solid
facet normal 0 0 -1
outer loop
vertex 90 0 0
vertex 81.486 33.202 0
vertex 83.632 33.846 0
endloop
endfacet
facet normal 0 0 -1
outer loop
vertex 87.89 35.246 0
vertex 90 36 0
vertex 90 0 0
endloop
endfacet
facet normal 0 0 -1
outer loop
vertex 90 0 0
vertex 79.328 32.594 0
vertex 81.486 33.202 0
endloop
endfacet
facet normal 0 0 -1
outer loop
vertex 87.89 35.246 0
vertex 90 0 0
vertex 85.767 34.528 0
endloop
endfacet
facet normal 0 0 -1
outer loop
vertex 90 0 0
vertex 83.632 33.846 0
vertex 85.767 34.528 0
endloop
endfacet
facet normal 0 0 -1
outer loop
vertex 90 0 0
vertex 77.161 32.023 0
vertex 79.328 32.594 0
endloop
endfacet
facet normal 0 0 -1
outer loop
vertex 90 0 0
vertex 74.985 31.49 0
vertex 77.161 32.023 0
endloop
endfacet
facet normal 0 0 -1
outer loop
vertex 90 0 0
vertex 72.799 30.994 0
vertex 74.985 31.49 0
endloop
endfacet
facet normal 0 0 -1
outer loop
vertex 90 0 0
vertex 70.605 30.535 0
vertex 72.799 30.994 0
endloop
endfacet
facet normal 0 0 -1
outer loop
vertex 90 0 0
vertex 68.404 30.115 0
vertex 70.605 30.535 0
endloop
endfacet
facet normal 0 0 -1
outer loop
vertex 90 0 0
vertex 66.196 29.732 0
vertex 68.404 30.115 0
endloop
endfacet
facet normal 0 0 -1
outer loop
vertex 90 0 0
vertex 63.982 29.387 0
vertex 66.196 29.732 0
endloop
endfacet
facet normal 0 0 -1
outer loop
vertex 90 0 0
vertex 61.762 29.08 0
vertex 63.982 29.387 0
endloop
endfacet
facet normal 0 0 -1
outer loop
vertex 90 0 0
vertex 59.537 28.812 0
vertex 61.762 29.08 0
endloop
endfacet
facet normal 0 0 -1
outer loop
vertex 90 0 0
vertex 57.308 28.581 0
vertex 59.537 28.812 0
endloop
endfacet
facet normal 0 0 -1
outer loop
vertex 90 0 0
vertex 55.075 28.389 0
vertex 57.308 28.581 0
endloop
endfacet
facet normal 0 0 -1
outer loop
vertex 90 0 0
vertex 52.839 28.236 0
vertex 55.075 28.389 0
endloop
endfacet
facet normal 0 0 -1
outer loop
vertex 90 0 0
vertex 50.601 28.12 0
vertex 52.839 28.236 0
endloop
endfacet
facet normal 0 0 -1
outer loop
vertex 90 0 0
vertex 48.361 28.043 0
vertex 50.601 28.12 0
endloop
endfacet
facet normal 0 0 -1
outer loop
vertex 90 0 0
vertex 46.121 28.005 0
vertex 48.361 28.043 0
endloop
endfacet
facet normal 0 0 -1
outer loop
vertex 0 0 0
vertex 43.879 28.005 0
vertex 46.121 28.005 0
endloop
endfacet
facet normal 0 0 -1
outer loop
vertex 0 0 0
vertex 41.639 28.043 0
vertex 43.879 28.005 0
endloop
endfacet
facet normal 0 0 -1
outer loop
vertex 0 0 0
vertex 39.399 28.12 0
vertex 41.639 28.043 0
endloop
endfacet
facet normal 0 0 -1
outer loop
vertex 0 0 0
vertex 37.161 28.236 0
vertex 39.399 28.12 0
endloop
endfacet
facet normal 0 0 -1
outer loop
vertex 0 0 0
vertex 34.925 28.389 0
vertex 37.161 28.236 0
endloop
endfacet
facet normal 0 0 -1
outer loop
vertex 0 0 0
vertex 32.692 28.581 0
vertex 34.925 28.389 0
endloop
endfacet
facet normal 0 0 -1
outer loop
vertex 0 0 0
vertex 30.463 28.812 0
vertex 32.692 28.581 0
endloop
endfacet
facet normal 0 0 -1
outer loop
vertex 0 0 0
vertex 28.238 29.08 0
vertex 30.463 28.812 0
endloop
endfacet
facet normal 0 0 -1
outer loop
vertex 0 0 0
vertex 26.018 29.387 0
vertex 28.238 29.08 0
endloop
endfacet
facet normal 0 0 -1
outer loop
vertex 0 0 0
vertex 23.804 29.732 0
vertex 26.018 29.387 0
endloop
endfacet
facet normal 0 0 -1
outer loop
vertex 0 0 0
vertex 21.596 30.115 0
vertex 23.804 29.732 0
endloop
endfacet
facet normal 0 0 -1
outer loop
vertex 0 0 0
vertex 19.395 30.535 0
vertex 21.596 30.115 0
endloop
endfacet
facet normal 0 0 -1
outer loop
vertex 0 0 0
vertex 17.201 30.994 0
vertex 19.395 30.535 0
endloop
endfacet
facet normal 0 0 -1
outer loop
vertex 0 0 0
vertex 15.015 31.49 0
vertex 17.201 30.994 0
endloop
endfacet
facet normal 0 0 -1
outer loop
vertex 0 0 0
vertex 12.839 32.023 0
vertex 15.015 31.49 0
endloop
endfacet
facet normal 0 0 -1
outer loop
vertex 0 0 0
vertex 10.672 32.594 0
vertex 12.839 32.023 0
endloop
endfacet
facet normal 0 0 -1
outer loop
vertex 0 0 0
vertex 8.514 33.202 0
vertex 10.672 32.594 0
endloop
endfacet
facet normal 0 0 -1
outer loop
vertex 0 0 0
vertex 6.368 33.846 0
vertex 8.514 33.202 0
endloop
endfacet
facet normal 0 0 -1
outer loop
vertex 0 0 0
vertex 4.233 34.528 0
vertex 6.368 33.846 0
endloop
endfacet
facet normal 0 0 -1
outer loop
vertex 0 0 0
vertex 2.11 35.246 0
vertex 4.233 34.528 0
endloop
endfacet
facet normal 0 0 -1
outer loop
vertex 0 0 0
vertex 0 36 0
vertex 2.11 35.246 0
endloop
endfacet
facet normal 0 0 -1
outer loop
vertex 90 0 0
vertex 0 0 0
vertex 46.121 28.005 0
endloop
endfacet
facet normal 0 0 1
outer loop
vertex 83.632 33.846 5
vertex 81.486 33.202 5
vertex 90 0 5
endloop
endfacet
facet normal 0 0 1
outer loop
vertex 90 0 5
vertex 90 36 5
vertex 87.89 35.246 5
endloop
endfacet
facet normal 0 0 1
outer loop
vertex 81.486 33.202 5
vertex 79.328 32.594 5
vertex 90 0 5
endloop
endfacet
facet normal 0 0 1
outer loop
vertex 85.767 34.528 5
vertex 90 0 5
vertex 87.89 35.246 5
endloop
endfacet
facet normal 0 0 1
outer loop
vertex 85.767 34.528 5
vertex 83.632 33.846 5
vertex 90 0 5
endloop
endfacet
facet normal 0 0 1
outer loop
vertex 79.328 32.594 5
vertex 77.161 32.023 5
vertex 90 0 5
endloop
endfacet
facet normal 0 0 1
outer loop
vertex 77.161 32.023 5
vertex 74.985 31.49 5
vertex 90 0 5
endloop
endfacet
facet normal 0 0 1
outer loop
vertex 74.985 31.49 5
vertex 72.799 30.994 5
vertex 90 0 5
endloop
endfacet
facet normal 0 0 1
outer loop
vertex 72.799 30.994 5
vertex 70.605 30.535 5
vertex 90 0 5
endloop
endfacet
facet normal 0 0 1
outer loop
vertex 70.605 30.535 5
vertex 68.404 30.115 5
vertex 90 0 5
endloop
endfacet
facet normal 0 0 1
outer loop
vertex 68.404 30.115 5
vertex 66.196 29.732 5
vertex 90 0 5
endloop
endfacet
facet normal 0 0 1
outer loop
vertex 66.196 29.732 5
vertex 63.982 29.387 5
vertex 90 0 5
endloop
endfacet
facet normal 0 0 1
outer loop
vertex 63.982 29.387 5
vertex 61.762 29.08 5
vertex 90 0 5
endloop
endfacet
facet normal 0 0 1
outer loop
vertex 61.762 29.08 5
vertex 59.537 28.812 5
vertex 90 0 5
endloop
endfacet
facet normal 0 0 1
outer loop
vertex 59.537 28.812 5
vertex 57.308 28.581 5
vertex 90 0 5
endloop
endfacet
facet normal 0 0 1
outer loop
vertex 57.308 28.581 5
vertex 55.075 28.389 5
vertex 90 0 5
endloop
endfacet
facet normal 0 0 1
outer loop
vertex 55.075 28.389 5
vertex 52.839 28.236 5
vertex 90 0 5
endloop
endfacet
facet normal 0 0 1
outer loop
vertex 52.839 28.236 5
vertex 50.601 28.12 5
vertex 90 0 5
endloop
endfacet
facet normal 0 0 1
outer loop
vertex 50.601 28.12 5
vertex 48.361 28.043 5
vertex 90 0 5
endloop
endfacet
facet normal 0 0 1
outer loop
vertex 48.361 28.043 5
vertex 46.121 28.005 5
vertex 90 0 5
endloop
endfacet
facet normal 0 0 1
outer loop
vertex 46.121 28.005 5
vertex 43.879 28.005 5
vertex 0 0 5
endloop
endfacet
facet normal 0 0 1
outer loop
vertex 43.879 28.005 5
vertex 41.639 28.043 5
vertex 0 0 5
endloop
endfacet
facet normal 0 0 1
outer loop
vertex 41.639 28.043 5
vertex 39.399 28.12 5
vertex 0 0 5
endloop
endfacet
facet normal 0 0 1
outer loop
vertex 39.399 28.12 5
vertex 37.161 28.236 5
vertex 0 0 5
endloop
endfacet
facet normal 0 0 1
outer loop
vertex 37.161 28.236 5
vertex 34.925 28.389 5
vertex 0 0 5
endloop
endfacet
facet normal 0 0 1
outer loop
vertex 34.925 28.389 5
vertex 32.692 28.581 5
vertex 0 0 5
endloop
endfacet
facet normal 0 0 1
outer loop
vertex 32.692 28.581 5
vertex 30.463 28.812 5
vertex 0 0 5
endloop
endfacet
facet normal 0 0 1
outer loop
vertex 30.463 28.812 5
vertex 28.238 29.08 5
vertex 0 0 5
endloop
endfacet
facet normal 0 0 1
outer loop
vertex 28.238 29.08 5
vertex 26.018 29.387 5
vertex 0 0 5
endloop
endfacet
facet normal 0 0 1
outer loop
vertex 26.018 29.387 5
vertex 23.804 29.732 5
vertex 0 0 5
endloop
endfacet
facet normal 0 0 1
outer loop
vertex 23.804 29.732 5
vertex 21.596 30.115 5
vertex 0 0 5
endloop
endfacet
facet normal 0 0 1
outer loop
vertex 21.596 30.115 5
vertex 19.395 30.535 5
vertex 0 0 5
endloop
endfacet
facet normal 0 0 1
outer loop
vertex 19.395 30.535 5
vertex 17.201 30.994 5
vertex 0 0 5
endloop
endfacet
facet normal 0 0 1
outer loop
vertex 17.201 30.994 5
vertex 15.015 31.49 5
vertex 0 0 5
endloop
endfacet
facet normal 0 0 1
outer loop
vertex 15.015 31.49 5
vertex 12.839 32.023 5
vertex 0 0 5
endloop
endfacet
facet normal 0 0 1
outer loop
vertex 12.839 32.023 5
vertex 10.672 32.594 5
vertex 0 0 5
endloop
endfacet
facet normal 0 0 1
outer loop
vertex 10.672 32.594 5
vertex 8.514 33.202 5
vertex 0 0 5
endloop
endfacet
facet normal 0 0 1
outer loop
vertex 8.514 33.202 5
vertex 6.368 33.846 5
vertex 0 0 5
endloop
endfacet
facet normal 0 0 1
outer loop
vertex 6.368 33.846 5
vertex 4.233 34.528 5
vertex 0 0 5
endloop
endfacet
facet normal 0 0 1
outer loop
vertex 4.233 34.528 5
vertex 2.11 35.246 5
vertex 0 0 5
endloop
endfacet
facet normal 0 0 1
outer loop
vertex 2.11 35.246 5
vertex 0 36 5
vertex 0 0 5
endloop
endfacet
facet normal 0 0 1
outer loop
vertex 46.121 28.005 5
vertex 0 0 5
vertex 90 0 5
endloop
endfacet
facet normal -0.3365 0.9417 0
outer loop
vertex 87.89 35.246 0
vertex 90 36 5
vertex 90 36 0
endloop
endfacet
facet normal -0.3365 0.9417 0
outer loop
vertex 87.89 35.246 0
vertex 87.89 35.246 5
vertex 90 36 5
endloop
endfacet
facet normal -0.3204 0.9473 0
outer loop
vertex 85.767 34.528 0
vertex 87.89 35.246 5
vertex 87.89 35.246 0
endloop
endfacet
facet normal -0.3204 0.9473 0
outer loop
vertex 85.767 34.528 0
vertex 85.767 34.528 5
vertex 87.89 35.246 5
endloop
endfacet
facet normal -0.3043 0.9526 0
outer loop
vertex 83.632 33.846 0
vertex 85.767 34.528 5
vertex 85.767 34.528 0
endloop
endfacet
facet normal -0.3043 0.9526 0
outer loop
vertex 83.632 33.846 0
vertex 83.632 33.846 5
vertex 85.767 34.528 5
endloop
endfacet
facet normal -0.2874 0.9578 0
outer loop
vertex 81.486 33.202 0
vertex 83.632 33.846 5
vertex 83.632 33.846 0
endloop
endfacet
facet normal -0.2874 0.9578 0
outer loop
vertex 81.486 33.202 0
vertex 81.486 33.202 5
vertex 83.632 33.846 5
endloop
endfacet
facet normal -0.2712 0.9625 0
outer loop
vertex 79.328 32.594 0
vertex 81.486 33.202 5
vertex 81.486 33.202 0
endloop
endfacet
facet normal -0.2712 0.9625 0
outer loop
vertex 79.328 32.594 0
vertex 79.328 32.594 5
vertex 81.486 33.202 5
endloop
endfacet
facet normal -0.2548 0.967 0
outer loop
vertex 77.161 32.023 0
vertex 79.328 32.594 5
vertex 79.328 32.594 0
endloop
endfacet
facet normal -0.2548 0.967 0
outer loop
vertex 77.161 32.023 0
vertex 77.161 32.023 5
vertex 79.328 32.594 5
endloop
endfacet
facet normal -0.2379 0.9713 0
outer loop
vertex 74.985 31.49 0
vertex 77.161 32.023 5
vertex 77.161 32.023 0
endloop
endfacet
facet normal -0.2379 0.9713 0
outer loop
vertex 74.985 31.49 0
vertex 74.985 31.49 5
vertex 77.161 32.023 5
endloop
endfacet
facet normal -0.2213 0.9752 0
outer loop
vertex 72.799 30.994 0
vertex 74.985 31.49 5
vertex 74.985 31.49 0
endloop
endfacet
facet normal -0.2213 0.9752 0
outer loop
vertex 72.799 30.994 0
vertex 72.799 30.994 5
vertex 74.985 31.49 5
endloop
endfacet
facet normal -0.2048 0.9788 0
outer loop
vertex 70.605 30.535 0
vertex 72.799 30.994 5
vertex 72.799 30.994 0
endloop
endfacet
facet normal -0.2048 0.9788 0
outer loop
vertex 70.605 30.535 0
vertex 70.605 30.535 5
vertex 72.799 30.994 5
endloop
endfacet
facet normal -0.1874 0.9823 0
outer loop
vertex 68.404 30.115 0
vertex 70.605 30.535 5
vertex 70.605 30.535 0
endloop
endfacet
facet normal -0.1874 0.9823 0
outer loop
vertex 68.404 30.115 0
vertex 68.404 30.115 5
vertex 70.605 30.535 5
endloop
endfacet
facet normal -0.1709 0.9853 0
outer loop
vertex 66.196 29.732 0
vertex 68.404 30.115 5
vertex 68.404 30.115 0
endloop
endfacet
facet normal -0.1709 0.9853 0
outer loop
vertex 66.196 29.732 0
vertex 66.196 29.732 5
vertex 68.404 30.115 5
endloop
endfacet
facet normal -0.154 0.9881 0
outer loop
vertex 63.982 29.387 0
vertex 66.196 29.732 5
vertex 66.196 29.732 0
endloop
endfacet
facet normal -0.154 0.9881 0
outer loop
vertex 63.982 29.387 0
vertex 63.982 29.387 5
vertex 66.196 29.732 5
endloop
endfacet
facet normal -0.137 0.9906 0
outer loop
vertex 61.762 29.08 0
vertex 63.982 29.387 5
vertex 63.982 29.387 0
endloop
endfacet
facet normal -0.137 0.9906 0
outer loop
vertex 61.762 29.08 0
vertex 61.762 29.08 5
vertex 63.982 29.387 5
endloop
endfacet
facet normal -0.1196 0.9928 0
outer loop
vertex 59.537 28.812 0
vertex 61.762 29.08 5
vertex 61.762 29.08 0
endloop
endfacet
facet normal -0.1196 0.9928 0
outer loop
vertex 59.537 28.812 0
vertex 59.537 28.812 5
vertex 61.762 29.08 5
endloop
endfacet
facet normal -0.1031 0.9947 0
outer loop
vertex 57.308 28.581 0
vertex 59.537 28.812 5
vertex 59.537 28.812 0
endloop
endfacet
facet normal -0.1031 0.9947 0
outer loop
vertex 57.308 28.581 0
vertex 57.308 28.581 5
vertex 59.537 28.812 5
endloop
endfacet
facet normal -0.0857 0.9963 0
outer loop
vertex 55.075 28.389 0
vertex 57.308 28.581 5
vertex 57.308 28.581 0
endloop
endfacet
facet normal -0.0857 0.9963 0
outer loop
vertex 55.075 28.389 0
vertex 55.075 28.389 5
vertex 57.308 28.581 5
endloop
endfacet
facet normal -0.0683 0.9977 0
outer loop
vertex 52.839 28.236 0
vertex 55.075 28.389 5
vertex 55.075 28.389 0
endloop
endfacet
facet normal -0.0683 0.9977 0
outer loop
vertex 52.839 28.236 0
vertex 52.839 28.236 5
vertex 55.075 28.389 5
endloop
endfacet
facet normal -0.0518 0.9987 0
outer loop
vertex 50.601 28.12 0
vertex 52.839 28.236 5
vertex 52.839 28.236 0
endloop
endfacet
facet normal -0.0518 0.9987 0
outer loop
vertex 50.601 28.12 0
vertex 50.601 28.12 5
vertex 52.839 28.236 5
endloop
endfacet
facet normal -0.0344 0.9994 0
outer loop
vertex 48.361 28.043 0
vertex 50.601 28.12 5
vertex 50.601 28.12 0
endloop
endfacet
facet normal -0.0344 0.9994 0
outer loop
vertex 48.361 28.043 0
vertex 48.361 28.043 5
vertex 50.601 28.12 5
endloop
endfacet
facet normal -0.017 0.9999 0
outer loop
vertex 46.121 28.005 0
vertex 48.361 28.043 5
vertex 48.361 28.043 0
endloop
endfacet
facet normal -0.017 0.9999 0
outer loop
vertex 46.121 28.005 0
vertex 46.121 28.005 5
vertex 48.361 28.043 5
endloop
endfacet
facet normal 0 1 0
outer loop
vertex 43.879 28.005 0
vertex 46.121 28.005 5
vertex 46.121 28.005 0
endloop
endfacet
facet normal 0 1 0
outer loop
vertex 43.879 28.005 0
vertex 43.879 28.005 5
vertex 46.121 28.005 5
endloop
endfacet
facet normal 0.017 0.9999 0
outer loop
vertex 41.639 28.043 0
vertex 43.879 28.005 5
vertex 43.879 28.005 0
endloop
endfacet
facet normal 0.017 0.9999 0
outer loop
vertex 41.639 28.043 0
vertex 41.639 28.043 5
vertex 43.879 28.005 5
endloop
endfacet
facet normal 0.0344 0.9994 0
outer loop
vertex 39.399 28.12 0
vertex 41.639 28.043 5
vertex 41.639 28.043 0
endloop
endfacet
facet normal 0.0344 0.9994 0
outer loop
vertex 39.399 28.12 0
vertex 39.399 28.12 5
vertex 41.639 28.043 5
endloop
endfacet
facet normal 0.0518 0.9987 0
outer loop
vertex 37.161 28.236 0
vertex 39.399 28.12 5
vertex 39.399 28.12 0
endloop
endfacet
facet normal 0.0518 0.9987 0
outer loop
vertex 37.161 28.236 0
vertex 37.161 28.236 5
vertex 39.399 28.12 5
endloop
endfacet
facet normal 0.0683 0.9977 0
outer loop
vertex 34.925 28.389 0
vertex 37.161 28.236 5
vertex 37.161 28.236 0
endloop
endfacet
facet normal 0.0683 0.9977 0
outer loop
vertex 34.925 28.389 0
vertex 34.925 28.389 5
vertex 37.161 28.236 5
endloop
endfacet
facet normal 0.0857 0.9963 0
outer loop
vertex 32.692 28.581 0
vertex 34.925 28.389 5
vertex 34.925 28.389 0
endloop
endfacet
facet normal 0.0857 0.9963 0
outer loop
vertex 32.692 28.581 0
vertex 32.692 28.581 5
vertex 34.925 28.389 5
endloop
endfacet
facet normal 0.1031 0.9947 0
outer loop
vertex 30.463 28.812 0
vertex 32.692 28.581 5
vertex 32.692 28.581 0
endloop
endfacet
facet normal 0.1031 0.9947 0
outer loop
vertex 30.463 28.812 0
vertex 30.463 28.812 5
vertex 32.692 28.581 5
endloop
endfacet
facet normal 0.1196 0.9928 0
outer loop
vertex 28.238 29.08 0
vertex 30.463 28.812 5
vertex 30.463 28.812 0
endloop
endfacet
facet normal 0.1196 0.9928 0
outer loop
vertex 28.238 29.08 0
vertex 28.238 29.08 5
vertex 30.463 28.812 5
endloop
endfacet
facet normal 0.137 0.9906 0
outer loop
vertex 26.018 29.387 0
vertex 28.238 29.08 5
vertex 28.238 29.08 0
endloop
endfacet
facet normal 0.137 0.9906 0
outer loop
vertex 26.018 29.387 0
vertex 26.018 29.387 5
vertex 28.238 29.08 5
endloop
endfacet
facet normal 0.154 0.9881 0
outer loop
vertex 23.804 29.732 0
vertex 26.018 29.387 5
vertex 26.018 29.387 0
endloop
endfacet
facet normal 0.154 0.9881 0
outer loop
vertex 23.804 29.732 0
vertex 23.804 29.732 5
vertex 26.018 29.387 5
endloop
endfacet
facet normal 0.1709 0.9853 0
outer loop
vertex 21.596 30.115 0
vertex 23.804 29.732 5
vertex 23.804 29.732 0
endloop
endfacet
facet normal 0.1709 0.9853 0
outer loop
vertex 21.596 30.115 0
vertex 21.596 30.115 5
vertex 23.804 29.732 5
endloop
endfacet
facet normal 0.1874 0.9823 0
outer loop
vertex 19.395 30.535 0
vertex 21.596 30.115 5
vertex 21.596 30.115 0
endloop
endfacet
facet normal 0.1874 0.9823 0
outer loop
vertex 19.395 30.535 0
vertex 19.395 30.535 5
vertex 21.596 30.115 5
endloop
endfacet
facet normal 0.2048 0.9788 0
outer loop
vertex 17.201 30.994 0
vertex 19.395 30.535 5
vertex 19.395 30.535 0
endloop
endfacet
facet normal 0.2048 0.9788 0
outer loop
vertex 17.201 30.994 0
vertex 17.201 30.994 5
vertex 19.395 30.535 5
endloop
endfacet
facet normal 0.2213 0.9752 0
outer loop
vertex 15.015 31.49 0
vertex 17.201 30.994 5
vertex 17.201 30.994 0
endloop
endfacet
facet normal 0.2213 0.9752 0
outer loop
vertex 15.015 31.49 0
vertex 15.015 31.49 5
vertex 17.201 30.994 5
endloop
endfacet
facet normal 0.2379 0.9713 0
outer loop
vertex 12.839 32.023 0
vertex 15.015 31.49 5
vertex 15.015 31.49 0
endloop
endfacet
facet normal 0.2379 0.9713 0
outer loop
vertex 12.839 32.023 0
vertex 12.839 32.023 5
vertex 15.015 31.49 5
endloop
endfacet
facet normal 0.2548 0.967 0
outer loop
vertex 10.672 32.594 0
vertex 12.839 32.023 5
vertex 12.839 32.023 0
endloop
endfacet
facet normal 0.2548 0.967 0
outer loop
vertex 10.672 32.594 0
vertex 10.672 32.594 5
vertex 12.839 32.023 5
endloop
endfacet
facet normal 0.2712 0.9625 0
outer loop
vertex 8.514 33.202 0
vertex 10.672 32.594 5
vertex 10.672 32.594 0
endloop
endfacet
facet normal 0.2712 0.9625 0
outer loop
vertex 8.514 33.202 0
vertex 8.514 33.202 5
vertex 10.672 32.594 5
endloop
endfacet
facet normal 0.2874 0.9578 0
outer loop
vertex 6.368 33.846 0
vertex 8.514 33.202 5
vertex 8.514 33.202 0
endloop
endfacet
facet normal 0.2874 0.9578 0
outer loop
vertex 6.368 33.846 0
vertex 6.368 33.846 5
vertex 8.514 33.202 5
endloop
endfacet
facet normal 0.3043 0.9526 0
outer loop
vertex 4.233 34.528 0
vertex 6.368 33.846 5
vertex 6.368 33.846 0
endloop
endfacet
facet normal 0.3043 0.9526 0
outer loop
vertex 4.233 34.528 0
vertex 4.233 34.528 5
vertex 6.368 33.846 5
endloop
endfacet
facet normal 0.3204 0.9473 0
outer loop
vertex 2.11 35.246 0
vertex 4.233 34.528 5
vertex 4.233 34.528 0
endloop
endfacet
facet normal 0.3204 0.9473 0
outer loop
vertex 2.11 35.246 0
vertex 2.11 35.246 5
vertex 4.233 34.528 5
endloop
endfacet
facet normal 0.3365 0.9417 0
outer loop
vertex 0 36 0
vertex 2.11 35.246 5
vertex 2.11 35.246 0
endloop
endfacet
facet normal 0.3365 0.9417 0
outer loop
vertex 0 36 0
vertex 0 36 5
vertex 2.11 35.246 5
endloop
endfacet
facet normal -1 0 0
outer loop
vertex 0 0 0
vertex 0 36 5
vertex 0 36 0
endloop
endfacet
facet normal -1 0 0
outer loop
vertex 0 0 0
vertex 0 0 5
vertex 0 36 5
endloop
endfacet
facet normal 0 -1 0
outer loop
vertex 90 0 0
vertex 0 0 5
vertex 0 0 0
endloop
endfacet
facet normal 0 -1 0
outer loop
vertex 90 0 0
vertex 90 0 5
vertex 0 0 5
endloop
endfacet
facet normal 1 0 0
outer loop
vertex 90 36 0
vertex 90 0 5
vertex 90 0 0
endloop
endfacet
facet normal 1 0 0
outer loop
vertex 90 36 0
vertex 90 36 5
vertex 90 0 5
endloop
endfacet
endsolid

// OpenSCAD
$fn = 32;

// ----------------------------------------------------------------------
// Arc profile plate: notch, 44 points
// ----------------------------------------------------------------------

// --- parameters (mm) ---
bar_l = 90;               // bar length, X
bar_w = 36;               // bar width, Y
notch_depth = 8;          // depth of the arc notch at mid-span
arc_r = 130.56;           // radius of the notch arc
arc_angle = 40.32;        // notch arc angle, degrees
arc_step = 1;             // sampling step of the notch arc, degrees
plate_t = 5;              // plate thickness, Z
fit_tol = 0.1;            // declared fit tolerance (prompt contract)
free_tol = 0.3;           // declared free tolerance (prompt contract)

profile = [[0, 0], [90, 0], [90, 36], [87.89, 35.246], [85.767, 34.528], [83.632, 33.846], [81.486, 33.202], [79.328, 32.594], [77.161, 32.023], [74.985, 31.49], [72.799, 30.994], [70.605, 30.535], [68.404, 30.115], [66.196, 29.732], [63.982, 29.387], [61.762, 29.08], [59.537, 28.812], [57.308, 28.581], [55.075, 28.389], [52.839, 28.236], [50.601, 28.12], [48.361, 28.043], [46.121, 28.005], [43.879, 28.005], [41.639, 28.043], [39.399, 28.12], [37.161, 28.236], [34.925, 28.389], [32.692, 28.581], [30.463, 28.812], [28.238, 29.08], [26.018, 29.387], [23.804, 29.732], [21.596, 30.115], [19.395, 30.535], [17.201, 30.994], [15.015, 31.49], [12.839, 32.023], [10.672, 32.594], [8.514, 33.202], [6.368, 33.846], [4.233, 34.528], [2.11, 35.246], [0, 36]];  // primary outline, 44 points, counter clockwise

// --- the one profile operation ---
linear_extrude(height = plate_t) polygon(points = profile);
